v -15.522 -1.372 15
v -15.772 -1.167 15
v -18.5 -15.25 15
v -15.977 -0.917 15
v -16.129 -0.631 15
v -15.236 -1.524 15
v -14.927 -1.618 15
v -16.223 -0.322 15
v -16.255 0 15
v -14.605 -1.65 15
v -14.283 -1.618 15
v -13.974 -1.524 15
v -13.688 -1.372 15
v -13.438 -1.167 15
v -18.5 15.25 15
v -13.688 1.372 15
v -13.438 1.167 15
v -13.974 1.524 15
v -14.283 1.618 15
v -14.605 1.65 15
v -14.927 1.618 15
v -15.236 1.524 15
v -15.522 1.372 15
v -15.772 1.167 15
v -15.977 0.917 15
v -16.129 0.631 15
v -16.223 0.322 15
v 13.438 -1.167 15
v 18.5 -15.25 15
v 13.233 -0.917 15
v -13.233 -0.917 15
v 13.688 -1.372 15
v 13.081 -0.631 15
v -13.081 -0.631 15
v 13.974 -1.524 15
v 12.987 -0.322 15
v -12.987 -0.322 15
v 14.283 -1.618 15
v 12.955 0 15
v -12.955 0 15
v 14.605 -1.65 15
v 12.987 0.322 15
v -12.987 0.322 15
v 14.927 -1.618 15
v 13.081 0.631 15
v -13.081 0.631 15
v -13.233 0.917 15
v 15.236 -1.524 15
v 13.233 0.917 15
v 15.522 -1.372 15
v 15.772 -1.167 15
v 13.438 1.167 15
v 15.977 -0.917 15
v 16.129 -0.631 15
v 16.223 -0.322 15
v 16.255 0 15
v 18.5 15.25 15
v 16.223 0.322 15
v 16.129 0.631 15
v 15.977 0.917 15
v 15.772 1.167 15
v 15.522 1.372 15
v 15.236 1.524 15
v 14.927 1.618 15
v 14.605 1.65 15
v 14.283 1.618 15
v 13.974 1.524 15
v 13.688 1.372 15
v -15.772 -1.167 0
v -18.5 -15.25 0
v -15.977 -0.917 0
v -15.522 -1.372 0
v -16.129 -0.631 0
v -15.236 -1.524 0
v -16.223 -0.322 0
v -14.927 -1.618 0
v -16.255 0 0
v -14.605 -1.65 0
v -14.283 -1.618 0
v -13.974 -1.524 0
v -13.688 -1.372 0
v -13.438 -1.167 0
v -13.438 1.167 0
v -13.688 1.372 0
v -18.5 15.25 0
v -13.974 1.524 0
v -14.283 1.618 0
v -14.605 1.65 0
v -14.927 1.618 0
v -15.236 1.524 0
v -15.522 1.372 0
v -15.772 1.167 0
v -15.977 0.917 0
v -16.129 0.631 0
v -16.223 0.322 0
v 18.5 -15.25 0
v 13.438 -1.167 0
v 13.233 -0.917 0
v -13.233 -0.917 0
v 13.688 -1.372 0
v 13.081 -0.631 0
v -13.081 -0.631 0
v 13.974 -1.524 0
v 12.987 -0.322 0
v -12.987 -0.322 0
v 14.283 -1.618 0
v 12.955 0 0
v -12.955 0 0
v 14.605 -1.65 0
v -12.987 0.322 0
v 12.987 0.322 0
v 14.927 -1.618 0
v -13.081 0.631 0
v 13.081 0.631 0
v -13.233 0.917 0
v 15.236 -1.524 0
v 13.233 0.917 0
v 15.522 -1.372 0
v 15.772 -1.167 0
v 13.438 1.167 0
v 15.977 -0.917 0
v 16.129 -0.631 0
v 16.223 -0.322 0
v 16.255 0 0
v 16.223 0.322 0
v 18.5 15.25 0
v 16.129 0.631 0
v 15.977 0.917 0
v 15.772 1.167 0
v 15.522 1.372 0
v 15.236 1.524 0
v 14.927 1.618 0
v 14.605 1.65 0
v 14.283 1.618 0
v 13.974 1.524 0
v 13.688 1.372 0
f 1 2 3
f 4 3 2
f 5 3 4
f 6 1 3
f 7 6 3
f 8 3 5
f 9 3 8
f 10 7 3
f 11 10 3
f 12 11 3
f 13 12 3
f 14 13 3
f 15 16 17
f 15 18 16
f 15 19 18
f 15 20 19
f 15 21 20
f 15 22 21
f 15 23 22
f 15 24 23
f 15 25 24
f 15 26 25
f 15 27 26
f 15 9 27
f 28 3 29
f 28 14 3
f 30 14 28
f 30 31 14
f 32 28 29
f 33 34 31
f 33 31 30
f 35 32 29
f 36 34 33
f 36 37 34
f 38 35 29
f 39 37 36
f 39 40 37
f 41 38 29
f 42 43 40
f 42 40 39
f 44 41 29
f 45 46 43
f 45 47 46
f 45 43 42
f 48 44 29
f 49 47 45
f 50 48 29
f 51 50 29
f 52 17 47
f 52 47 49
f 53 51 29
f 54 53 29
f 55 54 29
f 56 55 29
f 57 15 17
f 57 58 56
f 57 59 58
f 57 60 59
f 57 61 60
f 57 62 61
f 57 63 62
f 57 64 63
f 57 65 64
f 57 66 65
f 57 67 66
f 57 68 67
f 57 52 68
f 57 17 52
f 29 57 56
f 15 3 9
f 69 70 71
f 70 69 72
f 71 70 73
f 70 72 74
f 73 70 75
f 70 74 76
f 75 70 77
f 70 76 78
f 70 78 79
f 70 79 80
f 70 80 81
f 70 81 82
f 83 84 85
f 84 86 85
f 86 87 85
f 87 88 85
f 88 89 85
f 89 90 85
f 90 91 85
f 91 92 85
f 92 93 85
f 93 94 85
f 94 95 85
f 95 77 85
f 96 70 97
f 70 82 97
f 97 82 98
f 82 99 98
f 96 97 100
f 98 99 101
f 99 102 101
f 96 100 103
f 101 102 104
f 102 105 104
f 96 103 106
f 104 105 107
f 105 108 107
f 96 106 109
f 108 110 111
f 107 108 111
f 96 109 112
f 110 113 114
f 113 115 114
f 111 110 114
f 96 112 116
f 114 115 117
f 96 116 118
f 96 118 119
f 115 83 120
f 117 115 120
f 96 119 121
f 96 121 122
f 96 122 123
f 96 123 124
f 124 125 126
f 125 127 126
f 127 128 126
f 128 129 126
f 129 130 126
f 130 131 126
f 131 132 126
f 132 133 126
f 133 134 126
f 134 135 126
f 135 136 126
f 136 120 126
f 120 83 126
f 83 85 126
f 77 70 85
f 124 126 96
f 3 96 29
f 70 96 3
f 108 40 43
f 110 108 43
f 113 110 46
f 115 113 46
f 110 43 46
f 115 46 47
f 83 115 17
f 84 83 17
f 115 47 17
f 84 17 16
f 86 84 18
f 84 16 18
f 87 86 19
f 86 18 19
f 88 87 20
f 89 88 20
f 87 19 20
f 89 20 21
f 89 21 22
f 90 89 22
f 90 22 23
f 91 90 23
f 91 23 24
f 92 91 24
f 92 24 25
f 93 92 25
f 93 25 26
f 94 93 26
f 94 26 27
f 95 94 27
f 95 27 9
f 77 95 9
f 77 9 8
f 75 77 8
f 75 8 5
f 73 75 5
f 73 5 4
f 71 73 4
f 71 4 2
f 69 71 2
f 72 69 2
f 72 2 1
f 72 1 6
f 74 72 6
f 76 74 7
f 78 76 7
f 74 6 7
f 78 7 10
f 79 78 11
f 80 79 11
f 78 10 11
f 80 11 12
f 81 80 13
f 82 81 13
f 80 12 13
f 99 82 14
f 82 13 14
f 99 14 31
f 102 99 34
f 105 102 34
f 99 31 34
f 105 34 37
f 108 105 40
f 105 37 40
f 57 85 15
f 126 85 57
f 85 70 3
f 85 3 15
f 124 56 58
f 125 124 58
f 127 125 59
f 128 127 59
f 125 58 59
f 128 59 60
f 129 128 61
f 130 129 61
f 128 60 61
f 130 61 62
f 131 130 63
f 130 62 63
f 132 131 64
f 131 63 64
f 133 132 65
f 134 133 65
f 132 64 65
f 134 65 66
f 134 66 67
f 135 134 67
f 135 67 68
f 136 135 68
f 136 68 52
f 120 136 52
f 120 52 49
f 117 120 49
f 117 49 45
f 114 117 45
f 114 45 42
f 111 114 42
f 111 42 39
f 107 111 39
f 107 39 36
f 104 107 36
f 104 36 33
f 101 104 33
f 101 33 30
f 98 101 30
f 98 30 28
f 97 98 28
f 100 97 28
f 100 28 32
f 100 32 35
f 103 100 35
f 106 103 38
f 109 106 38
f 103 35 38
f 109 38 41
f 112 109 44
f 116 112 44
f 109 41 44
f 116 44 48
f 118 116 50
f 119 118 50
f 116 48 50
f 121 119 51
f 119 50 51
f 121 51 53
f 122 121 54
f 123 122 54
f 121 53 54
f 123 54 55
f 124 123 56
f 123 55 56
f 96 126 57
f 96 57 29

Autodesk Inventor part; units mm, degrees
ref_plane "YZ Plane" through (0, 0, 0) normal (1, 0, 0) x (0, 1, 0)
ref_plane "XZ Plane" through (0, 0, 0) normal (0, 1, 0) x (-1, 0, 0)
ref_plane "XY Plane" through (0, 0, 0) normal (0, 0, 1) x (1, 0, 0)
sketch "Sketch1" plane through (0, 0, 0) normal (0, 0, 1) x (1, 0, 0)
  line L0 (-18.5, 15.25) -> (18.5, 15.25)
  line L1 (18.5, 15.25) -> (18.5, -15.25)
  line L2 (18.5, -15.25) -> (-18.5, -15.25)
  line L3 (-18.5, -15.25) -> (-18.5, 15.25)
  point P0 (0, 0)
  point P1 (0, 15.25)
  point P2 (18.5, 0)
  dimension "d0" = 37
  dimension "d1" = 30.5
extrude "Extrusion1" add sketch "Sketch1" along normal blind 15
sketch "Sketch2" plane through (0, 0, 15) normal (0, 0, 1) x (1, 0, 0)
  circle A0 centre (14.605, 0) radius 1.65
  circle A1 centre (-14.605, 0) radius 1.65
  line L0 (14.605, 0) -> (-14.605, 0) construction
  point P0 (0, 0)
  point P1 (0, 0)
  dimension "d4" = 3.3
  dimension "d5" = 3.3
  dimension "d6" = 29.21
extrude "Extrusion2" cut sketch "Sketch2" against normal up to next
properties part number "bigeasydriver"
